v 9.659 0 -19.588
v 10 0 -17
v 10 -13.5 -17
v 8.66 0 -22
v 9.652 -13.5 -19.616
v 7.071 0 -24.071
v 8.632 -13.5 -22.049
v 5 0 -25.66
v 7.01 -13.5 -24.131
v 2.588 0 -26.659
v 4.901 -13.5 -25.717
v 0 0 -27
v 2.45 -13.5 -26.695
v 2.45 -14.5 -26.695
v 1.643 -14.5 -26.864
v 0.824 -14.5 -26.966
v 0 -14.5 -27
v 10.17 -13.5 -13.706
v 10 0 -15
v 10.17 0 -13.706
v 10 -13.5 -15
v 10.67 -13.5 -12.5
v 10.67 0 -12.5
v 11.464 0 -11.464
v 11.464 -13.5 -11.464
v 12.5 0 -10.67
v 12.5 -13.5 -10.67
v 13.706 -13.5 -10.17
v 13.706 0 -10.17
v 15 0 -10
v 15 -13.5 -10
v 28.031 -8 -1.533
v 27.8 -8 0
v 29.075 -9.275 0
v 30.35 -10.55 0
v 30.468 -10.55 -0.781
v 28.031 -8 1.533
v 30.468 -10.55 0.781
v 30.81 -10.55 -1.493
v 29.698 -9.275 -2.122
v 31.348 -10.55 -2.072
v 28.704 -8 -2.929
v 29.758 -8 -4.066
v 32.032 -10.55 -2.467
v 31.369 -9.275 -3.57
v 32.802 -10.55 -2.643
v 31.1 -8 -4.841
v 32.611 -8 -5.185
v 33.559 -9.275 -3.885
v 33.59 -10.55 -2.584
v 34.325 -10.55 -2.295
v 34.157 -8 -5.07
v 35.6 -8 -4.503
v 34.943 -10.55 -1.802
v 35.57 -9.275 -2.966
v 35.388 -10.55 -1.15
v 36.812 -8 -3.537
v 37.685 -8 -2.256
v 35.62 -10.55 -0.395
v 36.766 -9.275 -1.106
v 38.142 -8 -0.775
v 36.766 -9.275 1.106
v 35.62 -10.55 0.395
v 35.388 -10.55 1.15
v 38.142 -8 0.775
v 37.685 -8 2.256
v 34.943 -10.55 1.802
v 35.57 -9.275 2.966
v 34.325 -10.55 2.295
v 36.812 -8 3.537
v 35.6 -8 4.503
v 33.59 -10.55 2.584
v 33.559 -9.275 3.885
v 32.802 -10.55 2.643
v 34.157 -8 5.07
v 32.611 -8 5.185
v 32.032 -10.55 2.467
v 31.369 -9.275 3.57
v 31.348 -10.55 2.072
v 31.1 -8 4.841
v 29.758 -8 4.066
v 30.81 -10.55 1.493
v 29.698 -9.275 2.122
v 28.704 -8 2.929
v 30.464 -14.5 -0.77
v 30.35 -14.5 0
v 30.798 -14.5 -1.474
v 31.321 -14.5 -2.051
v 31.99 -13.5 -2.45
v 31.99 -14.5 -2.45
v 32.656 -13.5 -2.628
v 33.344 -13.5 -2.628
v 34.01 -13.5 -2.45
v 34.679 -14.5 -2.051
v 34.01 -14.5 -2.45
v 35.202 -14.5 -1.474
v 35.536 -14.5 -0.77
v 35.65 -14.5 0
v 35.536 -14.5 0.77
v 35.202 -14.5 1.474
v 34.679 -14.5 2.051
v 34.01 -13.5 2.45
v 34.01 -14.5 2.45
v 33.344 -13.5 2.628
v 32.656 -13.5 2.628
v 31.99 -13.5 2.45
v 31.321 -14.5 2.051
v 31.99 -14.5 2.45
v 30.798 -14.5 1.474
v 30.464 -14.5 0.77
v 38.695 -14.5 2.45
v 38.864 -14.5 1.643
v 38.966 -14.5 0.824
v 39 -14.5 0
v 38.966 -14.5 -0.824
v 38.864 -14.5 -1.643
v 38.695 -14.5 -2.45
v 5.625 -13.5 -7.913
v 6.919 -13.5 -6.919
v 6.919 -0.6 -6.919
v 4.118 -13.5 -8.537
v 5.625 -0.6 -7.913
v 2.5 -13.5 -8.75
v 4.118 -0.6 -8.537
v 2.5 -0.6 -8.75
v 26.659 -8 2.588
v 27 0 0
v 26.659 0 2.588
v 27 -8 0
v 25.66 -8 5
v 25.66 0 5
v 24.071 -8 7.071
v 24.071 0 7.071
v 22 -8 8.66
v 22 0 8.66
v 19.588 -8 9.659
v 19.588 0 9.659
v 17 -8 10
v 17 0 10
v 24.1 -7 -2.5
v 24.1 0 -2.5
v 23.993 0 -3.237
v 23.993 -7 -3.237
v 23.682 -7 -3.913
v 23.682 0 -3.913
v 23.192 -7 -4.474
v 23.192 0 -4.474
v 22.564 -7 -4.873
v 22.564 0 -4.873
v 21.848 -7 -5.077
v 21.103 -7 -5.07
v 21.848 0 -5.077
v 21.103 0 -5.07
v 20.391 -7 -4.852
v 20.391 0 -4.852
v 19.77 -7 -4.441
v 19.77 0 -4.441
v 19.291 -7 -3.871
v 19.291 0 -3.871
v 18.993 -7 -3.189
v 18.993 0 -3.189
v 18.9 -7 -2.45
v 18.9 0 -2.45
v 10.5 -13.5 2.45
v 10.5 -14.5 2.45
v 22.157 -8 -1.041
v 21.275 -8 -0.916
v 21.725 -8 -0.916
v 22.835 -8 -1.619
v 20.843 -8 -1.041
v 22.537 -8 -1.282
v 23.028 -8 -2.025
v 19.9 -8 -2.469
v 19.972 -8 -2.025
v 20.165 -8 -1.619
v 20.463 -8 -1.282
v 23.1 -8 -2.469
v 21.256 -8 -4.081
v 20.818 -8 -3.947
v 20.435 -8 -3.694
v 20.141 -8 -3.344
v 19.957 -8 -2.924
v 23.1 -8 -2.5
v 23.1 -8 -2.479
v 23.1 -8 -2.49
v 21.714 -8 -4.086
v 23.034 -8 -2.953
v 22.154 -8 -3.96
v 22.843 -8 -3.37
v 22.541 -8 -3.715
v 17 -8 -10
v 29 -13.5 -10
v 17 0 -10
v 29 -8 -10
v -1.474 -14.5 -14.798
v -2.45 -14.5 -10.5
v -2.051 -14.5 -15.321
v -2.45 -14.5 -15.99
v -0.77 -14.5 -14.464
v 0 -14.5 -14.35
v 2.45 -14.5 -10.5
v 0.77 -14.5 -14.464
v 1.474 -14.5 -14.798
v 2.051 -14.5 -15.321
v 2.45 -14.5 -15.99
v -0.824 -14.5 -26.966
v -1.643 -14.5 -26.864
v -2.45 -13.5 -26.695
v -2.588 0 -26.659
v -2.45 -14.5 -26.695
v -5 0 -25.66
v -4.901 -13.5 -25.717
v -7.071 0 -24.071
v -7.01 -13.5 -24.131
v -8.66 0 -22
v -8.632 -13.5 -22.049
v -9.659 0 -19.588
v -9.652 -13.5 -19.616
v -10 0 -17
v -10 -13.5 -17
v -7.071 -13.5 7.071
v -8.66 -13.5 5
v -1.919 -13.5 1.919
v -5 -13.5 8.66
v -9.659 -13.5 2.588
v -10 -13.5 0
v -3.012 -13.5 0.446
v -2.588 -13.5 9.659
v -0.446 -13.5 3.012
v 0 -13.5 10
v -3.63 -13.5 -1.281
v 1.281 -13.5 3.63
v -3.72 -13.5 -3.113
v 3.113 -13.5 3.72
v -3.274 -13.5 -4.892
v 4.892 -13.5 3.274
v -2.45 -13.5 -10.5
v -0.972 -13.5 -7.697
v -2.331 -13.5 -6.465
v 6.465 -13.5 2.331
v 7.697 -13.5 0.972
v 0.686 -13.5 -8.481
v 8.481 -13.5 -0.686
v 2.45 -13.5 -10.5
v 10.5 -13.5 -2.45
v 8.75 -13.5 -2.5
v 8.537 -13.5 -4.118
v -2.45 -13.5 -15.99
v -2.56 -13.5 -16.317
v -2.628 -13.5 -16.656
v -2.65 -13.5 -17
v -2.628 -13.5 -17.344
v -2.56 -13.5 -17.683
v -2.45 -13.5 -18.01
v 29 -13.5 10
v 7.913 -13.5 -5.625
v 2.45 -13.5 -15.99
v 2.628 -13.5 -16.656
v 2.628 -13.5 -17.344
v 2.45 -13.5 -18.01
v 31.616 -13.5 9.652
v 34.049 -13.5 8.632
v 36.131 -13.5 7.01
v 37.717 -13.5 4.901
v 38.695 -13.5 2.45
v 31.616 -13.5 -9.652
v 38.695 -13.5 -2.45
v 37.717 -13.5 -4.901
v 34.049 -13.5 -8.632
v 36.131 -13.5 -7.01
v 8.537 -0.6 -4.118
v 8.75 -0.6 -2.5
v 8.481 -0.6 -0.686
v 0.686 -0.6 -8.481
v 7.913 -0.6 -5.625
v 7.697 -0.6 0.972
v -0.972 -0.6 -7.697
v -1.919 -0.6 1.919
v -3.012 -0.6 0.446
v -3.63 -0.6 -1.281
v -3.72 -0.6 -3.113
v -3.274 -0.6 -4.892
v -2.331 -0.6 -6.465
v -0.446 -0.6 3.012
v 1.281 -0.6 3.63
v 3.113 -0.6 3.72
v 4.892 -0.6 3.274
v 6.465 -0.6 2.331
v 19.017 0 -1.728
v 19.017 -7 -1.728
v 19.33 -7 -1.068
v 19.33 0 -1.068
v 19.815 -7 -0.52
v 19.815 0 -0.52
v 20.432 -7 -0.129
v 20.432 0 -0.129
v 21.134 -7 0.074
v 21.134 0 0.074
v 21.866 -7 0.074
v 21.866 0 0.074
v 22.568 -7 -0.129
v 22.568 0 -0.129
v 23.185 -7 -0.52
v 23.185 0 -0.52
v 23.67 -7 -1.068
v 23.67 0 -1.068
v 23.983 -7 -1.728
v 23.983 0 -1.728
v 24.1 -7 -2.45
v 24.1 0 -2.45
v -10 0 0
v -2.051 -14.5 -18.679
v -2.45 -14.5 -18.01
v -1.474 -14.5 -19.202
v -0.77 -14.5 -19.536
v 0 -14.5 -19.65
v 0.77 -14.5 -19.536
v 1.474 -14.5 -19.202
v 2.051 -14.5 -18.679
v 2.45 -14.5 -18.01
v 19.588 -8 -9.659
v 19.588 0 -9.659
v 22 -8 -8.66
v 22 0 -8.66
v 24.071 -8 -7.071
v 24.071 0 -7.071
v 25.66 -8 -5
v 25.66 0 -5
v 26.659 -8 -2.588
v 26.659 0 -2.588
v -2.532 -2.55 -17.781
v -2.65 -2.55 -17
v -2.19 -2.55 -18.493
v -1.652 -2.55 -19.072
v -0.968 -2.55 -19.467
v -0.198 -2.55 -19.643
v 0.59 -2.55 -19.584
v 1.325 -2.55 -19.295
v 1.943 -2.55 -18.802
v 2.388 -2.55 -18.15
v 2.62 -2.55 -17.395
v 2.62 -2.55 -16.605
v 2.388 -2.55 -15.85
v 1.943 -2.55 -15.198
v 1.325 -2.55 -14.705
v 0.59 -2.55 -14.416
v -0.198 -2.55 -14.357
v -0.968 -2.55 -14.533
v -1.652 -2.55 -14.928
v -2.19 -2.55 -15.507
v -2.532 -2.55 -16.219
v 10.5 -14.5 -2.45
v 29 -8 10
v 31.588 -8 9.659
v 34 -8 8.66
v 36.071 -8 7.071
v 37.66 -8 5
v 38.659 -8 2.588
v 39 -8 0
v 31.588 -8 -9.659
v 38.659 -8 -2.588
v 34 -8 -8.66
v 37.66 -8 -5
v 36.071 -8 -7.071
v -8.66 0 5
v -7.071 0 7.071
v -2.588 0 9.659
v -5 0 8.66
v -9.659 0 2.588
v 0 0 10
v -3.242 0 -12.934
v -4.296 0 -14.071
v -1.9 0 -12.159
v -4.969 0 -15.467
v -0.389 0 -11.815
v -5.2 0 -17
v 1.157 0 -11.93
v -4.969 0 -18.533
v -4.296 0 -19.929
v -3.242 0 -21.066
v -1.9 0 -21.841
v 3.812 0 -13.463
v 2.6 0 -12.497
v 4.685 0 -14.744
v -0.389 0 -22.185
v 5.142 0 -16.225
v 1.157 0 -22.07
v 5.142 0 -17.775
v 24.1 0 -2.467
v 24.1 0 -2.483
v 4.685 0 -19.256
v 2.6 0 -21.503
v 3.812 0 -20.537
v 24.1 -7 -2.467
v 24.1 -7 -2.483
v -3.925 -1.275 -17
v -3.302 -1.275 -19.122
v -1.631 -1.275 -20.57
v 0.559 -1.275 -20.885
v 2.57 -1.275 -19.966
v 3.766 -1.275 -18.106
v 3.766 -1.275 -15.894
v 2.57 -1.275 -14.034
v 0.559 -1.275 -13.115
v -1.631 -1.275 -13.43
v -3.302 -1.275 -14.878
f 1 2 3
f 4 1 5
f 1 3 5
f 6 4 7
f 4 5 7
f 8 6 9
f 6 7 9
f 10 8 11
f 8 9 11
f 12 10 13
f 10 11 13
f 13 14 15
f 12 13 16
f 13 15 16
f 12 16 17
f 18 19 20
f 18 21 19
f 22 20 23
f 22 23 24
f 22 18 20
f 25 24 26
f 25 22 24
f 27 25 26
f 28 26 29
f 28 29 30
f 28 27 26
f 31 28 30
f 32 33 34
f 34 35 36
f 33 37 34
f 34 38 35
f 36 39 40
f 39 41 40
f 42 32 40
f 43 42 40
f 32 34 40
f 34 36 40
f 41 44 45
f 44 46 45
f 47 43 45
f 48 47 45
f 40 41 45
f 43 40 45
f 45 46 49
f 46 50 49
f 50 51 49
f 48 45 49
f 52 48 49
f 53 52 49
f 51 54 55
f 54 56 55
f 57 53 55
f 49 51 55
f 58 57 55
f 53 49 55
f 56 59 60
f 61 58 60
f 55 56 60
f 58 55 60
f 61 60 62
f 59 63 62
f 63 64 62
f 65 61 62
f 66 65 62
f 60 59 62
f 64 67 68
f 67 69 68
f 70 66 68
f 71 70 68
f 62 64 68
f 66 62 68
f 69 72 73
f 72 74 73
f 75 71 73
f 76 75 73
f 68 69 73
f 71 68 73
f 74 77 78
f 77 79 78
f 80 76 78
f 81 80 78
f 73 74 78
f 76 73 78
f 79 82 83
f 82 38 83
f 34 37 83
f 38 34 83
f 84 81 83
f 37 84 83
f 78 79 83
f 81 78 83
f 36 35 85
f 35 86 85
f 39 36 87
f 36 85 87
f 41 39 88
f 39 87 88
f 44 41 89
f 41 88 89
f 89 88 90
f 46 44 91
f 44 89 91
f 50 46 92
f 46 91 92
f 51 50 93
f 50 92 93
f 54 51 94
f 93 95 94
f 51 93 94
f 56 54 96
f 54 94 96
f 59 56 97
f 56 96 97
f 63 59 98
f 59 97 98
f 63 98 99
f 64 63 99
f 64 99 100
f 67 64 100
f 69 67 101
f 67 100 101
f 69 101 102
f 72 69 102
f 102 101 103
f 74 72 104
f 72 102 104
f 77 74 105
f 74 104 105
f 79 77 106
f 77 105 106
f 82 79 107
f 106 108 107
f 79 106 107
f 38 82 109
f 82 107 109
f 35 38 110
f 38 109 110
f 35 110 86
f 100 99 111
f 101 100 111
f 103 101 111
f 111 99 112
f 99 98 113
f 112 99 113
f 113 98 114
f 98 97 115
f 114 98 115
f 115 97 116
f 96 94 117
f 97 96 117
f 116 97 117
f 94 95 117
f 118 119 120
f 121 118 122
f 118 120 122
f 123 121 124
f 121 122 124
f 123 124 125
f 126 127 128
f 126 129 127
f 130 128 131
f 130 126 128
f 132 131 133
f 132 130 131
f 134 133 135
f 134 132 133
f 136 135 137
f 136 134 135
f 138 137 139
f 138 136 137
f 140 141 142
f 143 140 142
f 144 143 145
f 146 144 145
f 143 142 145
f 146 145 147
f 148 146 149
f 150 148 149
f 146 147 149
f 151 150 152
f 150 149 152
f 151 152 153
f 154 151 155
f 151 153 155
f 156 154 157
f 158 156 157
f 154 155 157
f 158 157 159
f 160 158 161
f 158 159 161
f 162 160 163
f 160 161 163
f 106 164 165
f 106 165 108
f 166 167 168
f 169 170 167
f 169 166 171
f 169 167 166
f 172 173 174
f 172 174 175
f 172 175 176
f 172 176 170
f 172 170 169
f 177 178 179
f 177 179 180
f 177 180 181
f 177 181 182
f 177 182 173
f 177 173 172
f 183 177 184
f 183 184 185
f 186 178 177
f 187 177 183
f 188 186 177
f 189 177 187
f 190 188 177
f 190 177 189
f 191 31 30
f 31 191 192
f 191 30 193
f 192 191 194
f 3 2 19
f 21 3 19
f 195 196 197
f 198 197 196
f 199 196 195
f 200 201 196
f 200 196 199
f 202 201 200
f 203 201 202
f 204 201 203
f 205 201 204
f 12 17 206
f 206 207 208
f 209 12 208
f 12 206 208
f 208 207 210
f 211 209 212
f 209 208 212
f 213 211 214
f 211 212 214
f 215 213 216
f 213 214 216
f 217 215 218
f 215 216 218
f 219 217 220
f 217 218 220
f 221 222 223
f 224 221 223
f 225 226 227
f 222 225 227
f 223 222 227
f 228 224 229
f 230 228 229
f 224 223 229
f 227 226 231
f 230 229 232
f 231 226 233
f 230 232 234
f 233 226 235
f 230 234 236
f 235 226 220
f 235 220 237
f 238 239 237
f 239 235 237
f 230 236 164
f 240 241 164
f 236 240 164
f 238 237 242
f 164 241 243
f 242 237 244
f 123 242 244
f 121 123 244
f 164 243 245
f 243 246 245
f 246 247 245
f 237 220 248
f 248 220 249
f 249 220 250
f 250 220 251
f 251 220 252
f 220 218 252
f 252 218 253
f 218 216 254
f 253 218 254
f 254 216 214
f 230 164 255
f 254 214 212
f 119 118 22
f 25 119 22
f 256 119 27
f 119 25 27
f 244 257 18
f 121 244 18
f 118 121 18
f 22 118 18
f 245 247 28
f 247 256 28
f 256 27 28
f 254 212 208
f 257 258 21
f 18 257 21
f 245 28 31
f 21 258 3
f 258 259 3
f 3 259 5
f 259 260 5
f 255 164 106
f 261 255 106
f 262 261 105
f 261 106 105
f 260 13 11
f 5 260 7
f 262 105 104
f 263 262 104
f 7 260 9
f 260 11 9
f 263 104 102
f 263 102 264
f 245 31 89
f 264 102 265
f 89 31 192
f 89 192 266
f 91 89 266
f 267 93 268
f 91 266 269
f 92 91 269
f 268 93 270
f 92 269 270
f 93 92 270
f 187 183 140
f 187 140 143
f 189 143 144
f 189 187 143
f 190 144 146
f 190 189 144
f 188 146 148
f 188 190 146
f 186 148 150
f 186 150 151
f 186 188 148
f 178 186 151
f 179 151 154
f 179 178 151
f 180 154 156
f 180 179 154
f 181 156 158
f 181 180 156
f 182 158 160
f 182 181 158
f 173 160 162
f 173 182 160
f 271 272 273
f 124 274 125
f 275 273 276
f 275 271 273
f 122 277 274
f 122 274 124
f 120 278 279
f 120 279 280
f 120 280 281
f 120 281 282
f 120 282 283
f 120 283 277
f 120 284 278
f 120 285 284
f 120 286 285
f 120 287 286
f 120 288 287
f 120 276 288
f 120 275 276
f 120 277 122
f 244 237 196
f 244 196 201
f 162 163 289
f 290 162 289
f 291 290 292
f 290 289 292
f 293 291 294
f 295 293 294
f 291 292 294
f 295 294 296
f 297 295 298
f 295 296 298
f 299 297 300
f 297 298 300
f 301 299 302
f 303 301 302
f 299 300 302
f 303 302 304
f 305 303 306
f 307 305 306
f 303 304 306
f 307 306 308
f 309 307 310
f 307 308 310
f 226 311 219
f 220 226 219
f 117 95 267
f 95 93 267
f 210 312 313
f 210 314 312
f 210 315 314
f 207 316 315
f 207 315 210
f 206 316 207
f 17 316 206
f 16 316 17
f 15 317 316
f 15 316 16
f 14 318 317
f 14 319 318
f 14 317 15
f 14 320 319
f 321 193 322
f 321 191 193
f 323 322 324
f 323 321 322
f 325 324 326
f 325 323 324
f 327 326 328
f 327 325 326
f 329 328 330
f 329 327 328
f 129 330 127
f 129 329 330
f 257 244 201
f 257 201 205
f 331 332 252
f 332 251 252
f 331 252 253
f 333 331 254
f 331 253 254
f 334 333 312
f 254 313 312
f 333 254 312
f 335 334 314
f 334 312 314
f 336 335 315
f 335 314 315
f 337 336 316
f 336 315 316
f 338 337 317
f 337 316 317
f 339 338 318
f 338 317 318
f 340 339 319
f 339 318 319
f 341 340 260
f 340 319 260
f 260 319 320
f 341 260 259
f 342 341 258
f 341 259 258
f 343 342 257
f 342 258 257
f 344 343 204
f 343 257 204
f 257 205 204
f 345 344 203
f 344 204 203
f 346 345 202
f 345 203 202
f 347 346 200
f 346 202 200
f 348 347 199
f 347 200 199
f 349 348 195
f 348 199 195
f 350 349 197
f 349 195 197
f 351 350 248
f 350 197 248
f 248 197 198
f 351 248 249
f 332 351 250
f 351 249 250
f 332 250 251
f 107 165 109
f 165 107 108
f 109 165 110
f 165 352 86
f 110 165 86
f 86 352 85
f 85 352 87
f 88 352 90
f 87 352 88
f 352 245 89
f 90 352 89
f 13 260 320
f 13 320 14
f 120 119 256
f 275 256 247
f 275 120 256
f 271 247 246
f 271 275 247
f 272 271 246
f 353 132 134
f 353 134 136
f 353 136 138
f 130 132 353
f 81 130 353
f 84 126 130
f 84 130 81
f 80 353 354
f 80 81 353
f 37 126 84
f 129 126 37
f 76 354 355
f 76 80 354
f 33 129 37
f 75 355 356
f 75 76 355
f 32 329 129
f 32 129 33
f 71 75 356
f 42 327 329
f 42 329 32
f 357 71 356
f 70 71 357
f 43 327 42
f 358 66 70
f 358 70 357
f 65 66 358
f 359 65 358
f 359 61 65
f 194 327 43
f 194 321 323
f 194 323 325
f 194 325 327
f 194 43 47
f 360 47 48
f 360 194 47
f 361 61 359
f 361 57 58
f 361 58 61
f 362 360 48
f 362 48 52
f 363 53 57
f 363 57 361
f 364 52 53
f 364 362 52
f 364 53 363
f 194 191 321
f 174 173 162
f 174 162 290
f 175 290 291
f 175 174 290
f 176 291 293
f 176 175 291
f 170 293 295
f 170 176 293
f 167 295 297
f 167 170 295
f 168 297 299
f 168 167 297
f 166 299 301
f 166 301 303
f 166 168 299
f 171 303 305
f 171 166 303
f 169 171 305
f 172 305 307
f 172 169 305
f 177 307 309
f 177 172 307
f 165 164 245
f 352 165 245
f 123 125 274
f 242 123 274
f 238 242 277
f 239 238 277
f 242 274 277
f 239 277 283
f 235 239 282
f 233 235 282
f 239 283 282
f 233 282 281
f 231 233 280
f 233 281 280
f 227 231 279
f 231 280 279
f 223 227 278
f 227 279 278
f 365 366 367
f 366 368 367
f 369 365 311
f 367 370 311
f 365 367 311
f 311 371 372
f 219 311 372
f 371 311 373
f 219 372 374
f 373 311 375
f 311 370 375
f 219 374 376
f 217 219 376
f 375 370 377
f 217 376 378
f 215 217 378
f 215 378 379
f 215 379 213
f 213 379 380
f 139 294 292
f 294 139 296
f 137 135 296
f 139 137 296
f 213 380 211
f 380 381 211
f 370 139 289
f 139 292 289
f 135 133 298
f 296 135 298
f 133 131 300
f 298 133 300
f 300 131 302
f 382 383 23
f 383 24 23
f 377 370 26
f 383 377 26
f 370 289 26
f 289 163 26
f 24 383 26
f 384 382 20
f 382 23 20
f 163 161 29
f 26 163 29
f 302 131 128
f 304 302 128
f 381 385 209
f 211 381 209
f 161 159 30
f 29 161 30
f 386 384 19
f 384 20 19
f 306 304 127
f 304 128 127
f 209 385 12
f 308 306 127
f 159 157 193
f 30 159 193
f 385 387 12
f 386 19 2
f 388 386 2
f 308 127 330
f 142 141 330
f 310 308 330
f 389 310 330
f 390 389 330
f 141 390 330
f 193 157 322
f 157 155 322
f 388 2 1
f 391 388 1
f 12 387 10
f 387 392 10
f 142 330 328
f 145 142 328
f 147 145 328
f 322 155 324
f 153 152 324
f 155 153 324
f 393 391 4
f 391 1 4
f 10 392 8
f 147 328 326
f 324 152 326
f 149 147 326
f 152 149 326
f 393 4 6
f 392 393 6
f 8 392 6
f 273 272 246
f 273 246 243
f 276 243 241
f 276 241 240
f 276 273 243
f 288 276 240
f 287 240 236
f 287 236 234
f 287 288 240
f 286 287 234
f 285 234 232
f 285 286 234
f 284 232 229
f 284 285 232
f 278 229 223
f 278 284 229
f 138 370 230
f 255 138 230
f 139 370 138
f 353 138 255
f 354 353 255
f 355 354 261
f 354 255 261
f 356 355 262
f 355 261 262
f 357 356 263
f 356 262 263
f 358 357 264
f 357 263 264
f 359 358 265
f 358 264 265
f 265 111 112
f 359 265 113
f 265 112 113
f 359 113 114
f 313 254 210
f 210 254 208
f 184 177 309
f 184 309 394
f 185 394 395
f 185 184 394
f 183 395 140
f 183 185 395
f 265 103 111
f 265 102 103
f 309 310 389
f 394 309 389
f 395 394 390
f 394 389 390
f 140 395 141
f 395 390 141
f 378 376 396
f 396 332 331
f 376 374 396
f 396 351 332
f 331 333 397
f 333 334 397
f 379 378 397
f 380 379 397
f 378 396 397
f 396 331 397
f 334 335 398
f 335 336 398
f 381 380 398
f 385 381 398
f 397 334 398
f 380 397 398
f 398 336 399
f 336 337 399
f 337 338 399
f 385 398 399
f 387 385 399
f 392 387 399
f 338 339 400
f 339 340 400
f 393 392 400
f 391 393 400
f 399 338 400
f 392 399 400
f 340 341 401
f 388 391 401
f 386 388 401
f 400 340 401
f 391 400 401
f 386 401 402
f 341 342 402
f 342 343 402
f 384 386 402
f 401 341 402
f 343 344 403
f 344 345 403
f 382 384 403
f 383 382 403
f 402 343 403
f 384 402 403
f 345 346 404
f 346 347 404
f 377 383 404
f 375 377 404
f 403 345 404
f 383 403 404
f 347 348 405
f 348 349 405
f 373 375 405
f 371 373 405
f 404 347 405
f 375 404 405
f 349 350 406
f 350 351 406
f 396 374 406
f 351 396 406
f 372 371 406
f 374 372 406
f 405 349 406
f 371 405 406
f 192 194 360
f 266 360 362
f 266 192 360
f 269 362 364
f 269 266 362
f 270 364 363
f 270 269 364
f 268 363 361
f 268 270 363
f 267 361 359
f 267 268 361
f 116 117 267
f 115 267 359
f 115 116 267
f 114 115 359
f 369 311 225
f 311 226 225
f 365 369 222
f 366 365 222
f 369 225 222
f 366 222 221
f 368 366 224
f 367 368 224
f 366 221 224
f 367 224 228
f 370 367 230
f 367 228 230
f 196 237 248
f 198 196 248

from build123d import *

# Parameters (mm, degrees)
BOSS_EXTRUDE1_DEPTH                             = 13.5
BOSS_EXTRUDE2_START                             = -13.5
SKETCH1_3_W                                     = 16.5
SKETCH1_3_H                                     = 4.9
BOSS_EXTRUDE2_DEPTH                             = 1
BOSS_EXTRUDE3_DEPTH                             = 0.6
CSK_FOR_M5_FLAT_HEAD_MACHINE_SCREW1_D           = 5.3
CSK_FOR_M5_FLAT_HEAD_MACHINE_SCREW1_CSINK_D     = 10.4
CSK_FOR_M5_FLAT_HEAD_MACHINE_SCREW1_CSINK_ANGLE = 90
BOSS_EXTRUDE4_START                             = -8
SKETCH1_5_W                                     = 12
SKETCH1_5_H                                     = 7.55
SKETCH1_5_H_2                                   = 4.9
BOSS_EXTRUDE4_DEPTH                             = 5.5
BOSS_EXTRUDE5_START                             = -13.5
SKETCH1_6_W                                     = 12
SKETCH1_6_H                                     = 4.9
BOSS_EXTRUDE5_DEPTH                             = 1
CSK_FOR_M5_FLAT_HEAD_MACHINE_SCREW2_D           = 5.3
CSK_FOR_M5_FLAT_HEAD_MACHINE_SCREW2_CSINK_D     = 10.4
CSK_FOR_M5_FLAT_HEAD_MACHINE_SCREW2_CSINK_ANGLE = 90
FILLET1_R                                       = 10
FILLET2_R                                       = 5
CUT_EXTRUDE1_DEPTH                              = 8
CHAMFER1_SIZE                                   = 1


with BuildPart() as part:
    # Sketch1 → Boss-Extrude1 (new body)
    with BuildSketch(Plane(origin=(0, 0, 0), x_dir=(1, 0, 0), z_dir=(0, 1, 0))):
        with BuildLine():
            Line((-1.919417382, -1.919417382), (-10, -10))
            Line((-10, -10), (27, -10))
            Line((27, -10), (27, -2.45))
            Line((27, -2.45), (10.5, -2.45))
            Line((10.5, -2.45), (10.5, 2.45))
            Line((10.5, 2.45), (18.900480814, 2.45))
            ThreePointArc((18.900480814, 2.45), (21.474998844, 5.099879794), (24.1, 2.5))
            ThreePointArc((24.1, 2.5), (24.099879794, 2.474998844), (24.099519186, 2.45))
            Line((24.099519186, 2.45), (27, 2.45))
            Line((27, 2.45), (27, 10))
            Line((27, 10), (10, 10))
            Line((10, 10), (6.919417382, 6.919417382))
            ThreePointArc((6.919417382, 6.919417382), (8.274247078, 4.891771452), (8.75, 2.5))
            ThreePointArc((8.75, 2.5), (4.891771452, -3.274247078), (-1.919417382, -1.919417382))
        make_face()
        with BuildLine():
            Line((10.5, -2.45), (27, -2.45))
            Line((27, -2.45), (27, 2.45))
            Line((27, 2.45), (24.099519186, 2.45))
            ThreePointArc((24.099519186, 2.45), (21.5, -0.1), (18.900480814, 2.45))
            Line((18.900480814, 2.45), (10.5, 2.45))
            Line((10.5, 2.45), (10.5, -2.45))
        make_face()
        with BuildLine():
            ThreePointArc((18.900480814, 2.45), (21.5, -0.1), (24.099519186, 2.45))
            Line((24.099519186, 2.45), (18.900480814, 2.45))
        make_face()
        with BuildLine():
            Line((18.900480814, 2.45), (24.099519186, 2.45))
            ThreePointArc((24.099519186, 2.45), (24.099879794, 2.474998844), (24.1, 2.5))
            ThreePointArc((24.1, 2.5), (21.474998844, 5.099879794), (18.900480814, 2.45))
        make_face()
    extrude(amount=-BOSS_EXTRUDE1_DEPTH)

    # Sketch1<3> → Boss-Extrude2 (add)
    with BuildSketch(Plane(origin=(0, 0, 0), x_dir=(1, 0, 0), z_dir=(0, 1, 0)).offset(BOSS_EXTRUDE2_START)):
        with Locations((18.75, 0)):
            Rectangle(SKETCH1_3_W, SKETCH1_3_H)
    extrude(amount=-BOSS_EXTRUDE2_DEPTH)

    # Sketch1<4> → Boss-Extrude3 (add)
    with BuildSketch(Plane(origin=(0, 0, 0), x_dir=(1, 0, 0), z_dir=(0, 1, 0))):
        with BuildLine():
            Line((6.919417382, 6.919417382), (-1.919417382, -1.919417382))
            ThreePointArc((-1.919417382, -1.919417382), (4.891771452, -3.274247078), (8.75, 2.5))
            ThreePointArc((8.75, 2.5), (8.274247078, 4.891771452), (6.919417382, 6.919417382))
        make_face()
    extrude(amount=-BOSS_EXTRUDE3_DEPTH)

    # Mirror1: part across plane


with BuildPart() as part_1:
    add(part.part)
    add(part.part.mirror(Plane(origin=(0, -13.5, 0), x_dir=(-0.7071067811865465, 0, 0.7071067811865486), z_dir=(0.7071067811865488, 0, 0.7071067811865464))))

    # CSK for M5 Flat Head Machine Screw1 (through all)
    with Locations(Plane(origin=(0, 0, 0), x_dir=(1, 0, 0), z_dir=(0, 1, 0))):
        with Locations((0, 17)):
            CounterSinkHole(CSK_FOR_M5_FLAT_HEAD_MACHINE_SCREW1_D / 2, CSK_FOR_M5_FLAT_HEAD_MACHINE_SCREW1_CSINK_D / 2, counter_sink_angle=CSK_FOR_M5_FLAT_HEAD_MACHINE_SCREW1_CSINK_ANGLE)

    # Sketch1<5> → Boss-Extrude4 (add)
    with BuildSketch(Plane(origin=(0, 0, 0), x_dir=(1, 0, 0), z_dir=(0, 1, 0)).offset(BOSS_EXTRUDE4_START)):
        with Locations((33, 6.225)):
            Rectangle(SKETCH1_5_W, SKETCH1_5_H)
        with Locations((33, 0)):
            Rectangle(SKETCH1_5_W, SKETCH1_5_H_2)
        with Locations((33, -6.225)):
            Rectangle(SKETCH1_5_W, SKETCH1_5_H)
    extrude(amount=-BOSS_EXTRUDE4_DEPTH)

    # Sketch1<6> → Boss-Extrude5 (add)
    with BuildSketch(Plane(origin=(0, 0, 0), x_dir=(1, 0, 0), z_dir=(0, 1, 0)).offset(BOSS_EXTRUDE5_START)):
        with Locations((33, 0)):
            Rectangle(SKETCH1_6_W, SKETCH1_6_H)
    extrude(amount=-BOSS_EXTRUDE5_DEPTH)

    # CSK for M5 Flat Head Machine Screw2 (through all)
    with Locations(Plane(origin=(0, -8, 0), x_dir=(1, 0, 0), z_dir=(0, 1, 0))):
        with Locations((33, 0)):
            CounterSinkHole(CSK_FOR_M5_FLAT_HEAD_MACHINE_SCREW2_D / 2, CSK_FOR_M5_FLAT_HEAD_MACHINE_SCREW2_CSINK_D / 2, counter_sink_angle=CSK_FOR_M5_FLAT_HEAD_MACHINE_SCREW2_CSINK_ANGLE)

    # Fillet1
    fillet1_edges = [part_1.edges().sort_by_distance(p)[0] for p in [
        (-10, -6.75, -27),
        (10, -6.75, -27),
        (39, -10.75, -10),
        (39, -10.75, 10),
        (27, -4, -10),
        (27, -4, 10),
        (-10, -6.75, 10),
    ]]
    fillet(fillet1_edges, radius=FILLET1_R - 0.0001)  # a hair under: the kernel refuses the full size

    # Fillet2
    fillet2_edges = [part_1.edges().sort_by_distance(p)[0] for p in [
        (10, -6.75, -10),
    ]]
    fillet(fillet2_edges, radius=FILLET2_R)

    # Sketch1<8> → Cut-Extrude1 (cut)
    with BuildSketch(Plane(origin=(0, 0, 0), x_dir=(1, 0, 0), z_dir=(0, 1, 0))):
        with BuildLine():
            ThreePointArc((18.900480814, 2.45), (21.5, -0.1), (24.099519186, 2.45))
            Line((24.099519186, 2.45), (18.900480814, 2.45))
        make_face()
        with BuildLine():
            Line((18.900480814, 2.45), (24.099519186, 2.45))
            ThreePointArc((24.099519186, 2.45), (24.099879794, 2.474998844), (24.1, 2.5))
            ThreePointArc((24.1, 2.5), (21.474998844, 5.099879794), (18.900480814, 2.45))
        make_face()
    extrude(amount=-CUT_EXTRUDE1_DEPTH, mode=Mode.SUBTRACT)

    # Chamfer1
    chamfer1_edges = [part_1.edges().sort_by_distance(p)[0] for p in [
        (24.099519186, -8, -2.55),
    ]]
    chamfer(chamfer1_edges, length=CHAMFER1_SIZE)


solid = part_1.part
